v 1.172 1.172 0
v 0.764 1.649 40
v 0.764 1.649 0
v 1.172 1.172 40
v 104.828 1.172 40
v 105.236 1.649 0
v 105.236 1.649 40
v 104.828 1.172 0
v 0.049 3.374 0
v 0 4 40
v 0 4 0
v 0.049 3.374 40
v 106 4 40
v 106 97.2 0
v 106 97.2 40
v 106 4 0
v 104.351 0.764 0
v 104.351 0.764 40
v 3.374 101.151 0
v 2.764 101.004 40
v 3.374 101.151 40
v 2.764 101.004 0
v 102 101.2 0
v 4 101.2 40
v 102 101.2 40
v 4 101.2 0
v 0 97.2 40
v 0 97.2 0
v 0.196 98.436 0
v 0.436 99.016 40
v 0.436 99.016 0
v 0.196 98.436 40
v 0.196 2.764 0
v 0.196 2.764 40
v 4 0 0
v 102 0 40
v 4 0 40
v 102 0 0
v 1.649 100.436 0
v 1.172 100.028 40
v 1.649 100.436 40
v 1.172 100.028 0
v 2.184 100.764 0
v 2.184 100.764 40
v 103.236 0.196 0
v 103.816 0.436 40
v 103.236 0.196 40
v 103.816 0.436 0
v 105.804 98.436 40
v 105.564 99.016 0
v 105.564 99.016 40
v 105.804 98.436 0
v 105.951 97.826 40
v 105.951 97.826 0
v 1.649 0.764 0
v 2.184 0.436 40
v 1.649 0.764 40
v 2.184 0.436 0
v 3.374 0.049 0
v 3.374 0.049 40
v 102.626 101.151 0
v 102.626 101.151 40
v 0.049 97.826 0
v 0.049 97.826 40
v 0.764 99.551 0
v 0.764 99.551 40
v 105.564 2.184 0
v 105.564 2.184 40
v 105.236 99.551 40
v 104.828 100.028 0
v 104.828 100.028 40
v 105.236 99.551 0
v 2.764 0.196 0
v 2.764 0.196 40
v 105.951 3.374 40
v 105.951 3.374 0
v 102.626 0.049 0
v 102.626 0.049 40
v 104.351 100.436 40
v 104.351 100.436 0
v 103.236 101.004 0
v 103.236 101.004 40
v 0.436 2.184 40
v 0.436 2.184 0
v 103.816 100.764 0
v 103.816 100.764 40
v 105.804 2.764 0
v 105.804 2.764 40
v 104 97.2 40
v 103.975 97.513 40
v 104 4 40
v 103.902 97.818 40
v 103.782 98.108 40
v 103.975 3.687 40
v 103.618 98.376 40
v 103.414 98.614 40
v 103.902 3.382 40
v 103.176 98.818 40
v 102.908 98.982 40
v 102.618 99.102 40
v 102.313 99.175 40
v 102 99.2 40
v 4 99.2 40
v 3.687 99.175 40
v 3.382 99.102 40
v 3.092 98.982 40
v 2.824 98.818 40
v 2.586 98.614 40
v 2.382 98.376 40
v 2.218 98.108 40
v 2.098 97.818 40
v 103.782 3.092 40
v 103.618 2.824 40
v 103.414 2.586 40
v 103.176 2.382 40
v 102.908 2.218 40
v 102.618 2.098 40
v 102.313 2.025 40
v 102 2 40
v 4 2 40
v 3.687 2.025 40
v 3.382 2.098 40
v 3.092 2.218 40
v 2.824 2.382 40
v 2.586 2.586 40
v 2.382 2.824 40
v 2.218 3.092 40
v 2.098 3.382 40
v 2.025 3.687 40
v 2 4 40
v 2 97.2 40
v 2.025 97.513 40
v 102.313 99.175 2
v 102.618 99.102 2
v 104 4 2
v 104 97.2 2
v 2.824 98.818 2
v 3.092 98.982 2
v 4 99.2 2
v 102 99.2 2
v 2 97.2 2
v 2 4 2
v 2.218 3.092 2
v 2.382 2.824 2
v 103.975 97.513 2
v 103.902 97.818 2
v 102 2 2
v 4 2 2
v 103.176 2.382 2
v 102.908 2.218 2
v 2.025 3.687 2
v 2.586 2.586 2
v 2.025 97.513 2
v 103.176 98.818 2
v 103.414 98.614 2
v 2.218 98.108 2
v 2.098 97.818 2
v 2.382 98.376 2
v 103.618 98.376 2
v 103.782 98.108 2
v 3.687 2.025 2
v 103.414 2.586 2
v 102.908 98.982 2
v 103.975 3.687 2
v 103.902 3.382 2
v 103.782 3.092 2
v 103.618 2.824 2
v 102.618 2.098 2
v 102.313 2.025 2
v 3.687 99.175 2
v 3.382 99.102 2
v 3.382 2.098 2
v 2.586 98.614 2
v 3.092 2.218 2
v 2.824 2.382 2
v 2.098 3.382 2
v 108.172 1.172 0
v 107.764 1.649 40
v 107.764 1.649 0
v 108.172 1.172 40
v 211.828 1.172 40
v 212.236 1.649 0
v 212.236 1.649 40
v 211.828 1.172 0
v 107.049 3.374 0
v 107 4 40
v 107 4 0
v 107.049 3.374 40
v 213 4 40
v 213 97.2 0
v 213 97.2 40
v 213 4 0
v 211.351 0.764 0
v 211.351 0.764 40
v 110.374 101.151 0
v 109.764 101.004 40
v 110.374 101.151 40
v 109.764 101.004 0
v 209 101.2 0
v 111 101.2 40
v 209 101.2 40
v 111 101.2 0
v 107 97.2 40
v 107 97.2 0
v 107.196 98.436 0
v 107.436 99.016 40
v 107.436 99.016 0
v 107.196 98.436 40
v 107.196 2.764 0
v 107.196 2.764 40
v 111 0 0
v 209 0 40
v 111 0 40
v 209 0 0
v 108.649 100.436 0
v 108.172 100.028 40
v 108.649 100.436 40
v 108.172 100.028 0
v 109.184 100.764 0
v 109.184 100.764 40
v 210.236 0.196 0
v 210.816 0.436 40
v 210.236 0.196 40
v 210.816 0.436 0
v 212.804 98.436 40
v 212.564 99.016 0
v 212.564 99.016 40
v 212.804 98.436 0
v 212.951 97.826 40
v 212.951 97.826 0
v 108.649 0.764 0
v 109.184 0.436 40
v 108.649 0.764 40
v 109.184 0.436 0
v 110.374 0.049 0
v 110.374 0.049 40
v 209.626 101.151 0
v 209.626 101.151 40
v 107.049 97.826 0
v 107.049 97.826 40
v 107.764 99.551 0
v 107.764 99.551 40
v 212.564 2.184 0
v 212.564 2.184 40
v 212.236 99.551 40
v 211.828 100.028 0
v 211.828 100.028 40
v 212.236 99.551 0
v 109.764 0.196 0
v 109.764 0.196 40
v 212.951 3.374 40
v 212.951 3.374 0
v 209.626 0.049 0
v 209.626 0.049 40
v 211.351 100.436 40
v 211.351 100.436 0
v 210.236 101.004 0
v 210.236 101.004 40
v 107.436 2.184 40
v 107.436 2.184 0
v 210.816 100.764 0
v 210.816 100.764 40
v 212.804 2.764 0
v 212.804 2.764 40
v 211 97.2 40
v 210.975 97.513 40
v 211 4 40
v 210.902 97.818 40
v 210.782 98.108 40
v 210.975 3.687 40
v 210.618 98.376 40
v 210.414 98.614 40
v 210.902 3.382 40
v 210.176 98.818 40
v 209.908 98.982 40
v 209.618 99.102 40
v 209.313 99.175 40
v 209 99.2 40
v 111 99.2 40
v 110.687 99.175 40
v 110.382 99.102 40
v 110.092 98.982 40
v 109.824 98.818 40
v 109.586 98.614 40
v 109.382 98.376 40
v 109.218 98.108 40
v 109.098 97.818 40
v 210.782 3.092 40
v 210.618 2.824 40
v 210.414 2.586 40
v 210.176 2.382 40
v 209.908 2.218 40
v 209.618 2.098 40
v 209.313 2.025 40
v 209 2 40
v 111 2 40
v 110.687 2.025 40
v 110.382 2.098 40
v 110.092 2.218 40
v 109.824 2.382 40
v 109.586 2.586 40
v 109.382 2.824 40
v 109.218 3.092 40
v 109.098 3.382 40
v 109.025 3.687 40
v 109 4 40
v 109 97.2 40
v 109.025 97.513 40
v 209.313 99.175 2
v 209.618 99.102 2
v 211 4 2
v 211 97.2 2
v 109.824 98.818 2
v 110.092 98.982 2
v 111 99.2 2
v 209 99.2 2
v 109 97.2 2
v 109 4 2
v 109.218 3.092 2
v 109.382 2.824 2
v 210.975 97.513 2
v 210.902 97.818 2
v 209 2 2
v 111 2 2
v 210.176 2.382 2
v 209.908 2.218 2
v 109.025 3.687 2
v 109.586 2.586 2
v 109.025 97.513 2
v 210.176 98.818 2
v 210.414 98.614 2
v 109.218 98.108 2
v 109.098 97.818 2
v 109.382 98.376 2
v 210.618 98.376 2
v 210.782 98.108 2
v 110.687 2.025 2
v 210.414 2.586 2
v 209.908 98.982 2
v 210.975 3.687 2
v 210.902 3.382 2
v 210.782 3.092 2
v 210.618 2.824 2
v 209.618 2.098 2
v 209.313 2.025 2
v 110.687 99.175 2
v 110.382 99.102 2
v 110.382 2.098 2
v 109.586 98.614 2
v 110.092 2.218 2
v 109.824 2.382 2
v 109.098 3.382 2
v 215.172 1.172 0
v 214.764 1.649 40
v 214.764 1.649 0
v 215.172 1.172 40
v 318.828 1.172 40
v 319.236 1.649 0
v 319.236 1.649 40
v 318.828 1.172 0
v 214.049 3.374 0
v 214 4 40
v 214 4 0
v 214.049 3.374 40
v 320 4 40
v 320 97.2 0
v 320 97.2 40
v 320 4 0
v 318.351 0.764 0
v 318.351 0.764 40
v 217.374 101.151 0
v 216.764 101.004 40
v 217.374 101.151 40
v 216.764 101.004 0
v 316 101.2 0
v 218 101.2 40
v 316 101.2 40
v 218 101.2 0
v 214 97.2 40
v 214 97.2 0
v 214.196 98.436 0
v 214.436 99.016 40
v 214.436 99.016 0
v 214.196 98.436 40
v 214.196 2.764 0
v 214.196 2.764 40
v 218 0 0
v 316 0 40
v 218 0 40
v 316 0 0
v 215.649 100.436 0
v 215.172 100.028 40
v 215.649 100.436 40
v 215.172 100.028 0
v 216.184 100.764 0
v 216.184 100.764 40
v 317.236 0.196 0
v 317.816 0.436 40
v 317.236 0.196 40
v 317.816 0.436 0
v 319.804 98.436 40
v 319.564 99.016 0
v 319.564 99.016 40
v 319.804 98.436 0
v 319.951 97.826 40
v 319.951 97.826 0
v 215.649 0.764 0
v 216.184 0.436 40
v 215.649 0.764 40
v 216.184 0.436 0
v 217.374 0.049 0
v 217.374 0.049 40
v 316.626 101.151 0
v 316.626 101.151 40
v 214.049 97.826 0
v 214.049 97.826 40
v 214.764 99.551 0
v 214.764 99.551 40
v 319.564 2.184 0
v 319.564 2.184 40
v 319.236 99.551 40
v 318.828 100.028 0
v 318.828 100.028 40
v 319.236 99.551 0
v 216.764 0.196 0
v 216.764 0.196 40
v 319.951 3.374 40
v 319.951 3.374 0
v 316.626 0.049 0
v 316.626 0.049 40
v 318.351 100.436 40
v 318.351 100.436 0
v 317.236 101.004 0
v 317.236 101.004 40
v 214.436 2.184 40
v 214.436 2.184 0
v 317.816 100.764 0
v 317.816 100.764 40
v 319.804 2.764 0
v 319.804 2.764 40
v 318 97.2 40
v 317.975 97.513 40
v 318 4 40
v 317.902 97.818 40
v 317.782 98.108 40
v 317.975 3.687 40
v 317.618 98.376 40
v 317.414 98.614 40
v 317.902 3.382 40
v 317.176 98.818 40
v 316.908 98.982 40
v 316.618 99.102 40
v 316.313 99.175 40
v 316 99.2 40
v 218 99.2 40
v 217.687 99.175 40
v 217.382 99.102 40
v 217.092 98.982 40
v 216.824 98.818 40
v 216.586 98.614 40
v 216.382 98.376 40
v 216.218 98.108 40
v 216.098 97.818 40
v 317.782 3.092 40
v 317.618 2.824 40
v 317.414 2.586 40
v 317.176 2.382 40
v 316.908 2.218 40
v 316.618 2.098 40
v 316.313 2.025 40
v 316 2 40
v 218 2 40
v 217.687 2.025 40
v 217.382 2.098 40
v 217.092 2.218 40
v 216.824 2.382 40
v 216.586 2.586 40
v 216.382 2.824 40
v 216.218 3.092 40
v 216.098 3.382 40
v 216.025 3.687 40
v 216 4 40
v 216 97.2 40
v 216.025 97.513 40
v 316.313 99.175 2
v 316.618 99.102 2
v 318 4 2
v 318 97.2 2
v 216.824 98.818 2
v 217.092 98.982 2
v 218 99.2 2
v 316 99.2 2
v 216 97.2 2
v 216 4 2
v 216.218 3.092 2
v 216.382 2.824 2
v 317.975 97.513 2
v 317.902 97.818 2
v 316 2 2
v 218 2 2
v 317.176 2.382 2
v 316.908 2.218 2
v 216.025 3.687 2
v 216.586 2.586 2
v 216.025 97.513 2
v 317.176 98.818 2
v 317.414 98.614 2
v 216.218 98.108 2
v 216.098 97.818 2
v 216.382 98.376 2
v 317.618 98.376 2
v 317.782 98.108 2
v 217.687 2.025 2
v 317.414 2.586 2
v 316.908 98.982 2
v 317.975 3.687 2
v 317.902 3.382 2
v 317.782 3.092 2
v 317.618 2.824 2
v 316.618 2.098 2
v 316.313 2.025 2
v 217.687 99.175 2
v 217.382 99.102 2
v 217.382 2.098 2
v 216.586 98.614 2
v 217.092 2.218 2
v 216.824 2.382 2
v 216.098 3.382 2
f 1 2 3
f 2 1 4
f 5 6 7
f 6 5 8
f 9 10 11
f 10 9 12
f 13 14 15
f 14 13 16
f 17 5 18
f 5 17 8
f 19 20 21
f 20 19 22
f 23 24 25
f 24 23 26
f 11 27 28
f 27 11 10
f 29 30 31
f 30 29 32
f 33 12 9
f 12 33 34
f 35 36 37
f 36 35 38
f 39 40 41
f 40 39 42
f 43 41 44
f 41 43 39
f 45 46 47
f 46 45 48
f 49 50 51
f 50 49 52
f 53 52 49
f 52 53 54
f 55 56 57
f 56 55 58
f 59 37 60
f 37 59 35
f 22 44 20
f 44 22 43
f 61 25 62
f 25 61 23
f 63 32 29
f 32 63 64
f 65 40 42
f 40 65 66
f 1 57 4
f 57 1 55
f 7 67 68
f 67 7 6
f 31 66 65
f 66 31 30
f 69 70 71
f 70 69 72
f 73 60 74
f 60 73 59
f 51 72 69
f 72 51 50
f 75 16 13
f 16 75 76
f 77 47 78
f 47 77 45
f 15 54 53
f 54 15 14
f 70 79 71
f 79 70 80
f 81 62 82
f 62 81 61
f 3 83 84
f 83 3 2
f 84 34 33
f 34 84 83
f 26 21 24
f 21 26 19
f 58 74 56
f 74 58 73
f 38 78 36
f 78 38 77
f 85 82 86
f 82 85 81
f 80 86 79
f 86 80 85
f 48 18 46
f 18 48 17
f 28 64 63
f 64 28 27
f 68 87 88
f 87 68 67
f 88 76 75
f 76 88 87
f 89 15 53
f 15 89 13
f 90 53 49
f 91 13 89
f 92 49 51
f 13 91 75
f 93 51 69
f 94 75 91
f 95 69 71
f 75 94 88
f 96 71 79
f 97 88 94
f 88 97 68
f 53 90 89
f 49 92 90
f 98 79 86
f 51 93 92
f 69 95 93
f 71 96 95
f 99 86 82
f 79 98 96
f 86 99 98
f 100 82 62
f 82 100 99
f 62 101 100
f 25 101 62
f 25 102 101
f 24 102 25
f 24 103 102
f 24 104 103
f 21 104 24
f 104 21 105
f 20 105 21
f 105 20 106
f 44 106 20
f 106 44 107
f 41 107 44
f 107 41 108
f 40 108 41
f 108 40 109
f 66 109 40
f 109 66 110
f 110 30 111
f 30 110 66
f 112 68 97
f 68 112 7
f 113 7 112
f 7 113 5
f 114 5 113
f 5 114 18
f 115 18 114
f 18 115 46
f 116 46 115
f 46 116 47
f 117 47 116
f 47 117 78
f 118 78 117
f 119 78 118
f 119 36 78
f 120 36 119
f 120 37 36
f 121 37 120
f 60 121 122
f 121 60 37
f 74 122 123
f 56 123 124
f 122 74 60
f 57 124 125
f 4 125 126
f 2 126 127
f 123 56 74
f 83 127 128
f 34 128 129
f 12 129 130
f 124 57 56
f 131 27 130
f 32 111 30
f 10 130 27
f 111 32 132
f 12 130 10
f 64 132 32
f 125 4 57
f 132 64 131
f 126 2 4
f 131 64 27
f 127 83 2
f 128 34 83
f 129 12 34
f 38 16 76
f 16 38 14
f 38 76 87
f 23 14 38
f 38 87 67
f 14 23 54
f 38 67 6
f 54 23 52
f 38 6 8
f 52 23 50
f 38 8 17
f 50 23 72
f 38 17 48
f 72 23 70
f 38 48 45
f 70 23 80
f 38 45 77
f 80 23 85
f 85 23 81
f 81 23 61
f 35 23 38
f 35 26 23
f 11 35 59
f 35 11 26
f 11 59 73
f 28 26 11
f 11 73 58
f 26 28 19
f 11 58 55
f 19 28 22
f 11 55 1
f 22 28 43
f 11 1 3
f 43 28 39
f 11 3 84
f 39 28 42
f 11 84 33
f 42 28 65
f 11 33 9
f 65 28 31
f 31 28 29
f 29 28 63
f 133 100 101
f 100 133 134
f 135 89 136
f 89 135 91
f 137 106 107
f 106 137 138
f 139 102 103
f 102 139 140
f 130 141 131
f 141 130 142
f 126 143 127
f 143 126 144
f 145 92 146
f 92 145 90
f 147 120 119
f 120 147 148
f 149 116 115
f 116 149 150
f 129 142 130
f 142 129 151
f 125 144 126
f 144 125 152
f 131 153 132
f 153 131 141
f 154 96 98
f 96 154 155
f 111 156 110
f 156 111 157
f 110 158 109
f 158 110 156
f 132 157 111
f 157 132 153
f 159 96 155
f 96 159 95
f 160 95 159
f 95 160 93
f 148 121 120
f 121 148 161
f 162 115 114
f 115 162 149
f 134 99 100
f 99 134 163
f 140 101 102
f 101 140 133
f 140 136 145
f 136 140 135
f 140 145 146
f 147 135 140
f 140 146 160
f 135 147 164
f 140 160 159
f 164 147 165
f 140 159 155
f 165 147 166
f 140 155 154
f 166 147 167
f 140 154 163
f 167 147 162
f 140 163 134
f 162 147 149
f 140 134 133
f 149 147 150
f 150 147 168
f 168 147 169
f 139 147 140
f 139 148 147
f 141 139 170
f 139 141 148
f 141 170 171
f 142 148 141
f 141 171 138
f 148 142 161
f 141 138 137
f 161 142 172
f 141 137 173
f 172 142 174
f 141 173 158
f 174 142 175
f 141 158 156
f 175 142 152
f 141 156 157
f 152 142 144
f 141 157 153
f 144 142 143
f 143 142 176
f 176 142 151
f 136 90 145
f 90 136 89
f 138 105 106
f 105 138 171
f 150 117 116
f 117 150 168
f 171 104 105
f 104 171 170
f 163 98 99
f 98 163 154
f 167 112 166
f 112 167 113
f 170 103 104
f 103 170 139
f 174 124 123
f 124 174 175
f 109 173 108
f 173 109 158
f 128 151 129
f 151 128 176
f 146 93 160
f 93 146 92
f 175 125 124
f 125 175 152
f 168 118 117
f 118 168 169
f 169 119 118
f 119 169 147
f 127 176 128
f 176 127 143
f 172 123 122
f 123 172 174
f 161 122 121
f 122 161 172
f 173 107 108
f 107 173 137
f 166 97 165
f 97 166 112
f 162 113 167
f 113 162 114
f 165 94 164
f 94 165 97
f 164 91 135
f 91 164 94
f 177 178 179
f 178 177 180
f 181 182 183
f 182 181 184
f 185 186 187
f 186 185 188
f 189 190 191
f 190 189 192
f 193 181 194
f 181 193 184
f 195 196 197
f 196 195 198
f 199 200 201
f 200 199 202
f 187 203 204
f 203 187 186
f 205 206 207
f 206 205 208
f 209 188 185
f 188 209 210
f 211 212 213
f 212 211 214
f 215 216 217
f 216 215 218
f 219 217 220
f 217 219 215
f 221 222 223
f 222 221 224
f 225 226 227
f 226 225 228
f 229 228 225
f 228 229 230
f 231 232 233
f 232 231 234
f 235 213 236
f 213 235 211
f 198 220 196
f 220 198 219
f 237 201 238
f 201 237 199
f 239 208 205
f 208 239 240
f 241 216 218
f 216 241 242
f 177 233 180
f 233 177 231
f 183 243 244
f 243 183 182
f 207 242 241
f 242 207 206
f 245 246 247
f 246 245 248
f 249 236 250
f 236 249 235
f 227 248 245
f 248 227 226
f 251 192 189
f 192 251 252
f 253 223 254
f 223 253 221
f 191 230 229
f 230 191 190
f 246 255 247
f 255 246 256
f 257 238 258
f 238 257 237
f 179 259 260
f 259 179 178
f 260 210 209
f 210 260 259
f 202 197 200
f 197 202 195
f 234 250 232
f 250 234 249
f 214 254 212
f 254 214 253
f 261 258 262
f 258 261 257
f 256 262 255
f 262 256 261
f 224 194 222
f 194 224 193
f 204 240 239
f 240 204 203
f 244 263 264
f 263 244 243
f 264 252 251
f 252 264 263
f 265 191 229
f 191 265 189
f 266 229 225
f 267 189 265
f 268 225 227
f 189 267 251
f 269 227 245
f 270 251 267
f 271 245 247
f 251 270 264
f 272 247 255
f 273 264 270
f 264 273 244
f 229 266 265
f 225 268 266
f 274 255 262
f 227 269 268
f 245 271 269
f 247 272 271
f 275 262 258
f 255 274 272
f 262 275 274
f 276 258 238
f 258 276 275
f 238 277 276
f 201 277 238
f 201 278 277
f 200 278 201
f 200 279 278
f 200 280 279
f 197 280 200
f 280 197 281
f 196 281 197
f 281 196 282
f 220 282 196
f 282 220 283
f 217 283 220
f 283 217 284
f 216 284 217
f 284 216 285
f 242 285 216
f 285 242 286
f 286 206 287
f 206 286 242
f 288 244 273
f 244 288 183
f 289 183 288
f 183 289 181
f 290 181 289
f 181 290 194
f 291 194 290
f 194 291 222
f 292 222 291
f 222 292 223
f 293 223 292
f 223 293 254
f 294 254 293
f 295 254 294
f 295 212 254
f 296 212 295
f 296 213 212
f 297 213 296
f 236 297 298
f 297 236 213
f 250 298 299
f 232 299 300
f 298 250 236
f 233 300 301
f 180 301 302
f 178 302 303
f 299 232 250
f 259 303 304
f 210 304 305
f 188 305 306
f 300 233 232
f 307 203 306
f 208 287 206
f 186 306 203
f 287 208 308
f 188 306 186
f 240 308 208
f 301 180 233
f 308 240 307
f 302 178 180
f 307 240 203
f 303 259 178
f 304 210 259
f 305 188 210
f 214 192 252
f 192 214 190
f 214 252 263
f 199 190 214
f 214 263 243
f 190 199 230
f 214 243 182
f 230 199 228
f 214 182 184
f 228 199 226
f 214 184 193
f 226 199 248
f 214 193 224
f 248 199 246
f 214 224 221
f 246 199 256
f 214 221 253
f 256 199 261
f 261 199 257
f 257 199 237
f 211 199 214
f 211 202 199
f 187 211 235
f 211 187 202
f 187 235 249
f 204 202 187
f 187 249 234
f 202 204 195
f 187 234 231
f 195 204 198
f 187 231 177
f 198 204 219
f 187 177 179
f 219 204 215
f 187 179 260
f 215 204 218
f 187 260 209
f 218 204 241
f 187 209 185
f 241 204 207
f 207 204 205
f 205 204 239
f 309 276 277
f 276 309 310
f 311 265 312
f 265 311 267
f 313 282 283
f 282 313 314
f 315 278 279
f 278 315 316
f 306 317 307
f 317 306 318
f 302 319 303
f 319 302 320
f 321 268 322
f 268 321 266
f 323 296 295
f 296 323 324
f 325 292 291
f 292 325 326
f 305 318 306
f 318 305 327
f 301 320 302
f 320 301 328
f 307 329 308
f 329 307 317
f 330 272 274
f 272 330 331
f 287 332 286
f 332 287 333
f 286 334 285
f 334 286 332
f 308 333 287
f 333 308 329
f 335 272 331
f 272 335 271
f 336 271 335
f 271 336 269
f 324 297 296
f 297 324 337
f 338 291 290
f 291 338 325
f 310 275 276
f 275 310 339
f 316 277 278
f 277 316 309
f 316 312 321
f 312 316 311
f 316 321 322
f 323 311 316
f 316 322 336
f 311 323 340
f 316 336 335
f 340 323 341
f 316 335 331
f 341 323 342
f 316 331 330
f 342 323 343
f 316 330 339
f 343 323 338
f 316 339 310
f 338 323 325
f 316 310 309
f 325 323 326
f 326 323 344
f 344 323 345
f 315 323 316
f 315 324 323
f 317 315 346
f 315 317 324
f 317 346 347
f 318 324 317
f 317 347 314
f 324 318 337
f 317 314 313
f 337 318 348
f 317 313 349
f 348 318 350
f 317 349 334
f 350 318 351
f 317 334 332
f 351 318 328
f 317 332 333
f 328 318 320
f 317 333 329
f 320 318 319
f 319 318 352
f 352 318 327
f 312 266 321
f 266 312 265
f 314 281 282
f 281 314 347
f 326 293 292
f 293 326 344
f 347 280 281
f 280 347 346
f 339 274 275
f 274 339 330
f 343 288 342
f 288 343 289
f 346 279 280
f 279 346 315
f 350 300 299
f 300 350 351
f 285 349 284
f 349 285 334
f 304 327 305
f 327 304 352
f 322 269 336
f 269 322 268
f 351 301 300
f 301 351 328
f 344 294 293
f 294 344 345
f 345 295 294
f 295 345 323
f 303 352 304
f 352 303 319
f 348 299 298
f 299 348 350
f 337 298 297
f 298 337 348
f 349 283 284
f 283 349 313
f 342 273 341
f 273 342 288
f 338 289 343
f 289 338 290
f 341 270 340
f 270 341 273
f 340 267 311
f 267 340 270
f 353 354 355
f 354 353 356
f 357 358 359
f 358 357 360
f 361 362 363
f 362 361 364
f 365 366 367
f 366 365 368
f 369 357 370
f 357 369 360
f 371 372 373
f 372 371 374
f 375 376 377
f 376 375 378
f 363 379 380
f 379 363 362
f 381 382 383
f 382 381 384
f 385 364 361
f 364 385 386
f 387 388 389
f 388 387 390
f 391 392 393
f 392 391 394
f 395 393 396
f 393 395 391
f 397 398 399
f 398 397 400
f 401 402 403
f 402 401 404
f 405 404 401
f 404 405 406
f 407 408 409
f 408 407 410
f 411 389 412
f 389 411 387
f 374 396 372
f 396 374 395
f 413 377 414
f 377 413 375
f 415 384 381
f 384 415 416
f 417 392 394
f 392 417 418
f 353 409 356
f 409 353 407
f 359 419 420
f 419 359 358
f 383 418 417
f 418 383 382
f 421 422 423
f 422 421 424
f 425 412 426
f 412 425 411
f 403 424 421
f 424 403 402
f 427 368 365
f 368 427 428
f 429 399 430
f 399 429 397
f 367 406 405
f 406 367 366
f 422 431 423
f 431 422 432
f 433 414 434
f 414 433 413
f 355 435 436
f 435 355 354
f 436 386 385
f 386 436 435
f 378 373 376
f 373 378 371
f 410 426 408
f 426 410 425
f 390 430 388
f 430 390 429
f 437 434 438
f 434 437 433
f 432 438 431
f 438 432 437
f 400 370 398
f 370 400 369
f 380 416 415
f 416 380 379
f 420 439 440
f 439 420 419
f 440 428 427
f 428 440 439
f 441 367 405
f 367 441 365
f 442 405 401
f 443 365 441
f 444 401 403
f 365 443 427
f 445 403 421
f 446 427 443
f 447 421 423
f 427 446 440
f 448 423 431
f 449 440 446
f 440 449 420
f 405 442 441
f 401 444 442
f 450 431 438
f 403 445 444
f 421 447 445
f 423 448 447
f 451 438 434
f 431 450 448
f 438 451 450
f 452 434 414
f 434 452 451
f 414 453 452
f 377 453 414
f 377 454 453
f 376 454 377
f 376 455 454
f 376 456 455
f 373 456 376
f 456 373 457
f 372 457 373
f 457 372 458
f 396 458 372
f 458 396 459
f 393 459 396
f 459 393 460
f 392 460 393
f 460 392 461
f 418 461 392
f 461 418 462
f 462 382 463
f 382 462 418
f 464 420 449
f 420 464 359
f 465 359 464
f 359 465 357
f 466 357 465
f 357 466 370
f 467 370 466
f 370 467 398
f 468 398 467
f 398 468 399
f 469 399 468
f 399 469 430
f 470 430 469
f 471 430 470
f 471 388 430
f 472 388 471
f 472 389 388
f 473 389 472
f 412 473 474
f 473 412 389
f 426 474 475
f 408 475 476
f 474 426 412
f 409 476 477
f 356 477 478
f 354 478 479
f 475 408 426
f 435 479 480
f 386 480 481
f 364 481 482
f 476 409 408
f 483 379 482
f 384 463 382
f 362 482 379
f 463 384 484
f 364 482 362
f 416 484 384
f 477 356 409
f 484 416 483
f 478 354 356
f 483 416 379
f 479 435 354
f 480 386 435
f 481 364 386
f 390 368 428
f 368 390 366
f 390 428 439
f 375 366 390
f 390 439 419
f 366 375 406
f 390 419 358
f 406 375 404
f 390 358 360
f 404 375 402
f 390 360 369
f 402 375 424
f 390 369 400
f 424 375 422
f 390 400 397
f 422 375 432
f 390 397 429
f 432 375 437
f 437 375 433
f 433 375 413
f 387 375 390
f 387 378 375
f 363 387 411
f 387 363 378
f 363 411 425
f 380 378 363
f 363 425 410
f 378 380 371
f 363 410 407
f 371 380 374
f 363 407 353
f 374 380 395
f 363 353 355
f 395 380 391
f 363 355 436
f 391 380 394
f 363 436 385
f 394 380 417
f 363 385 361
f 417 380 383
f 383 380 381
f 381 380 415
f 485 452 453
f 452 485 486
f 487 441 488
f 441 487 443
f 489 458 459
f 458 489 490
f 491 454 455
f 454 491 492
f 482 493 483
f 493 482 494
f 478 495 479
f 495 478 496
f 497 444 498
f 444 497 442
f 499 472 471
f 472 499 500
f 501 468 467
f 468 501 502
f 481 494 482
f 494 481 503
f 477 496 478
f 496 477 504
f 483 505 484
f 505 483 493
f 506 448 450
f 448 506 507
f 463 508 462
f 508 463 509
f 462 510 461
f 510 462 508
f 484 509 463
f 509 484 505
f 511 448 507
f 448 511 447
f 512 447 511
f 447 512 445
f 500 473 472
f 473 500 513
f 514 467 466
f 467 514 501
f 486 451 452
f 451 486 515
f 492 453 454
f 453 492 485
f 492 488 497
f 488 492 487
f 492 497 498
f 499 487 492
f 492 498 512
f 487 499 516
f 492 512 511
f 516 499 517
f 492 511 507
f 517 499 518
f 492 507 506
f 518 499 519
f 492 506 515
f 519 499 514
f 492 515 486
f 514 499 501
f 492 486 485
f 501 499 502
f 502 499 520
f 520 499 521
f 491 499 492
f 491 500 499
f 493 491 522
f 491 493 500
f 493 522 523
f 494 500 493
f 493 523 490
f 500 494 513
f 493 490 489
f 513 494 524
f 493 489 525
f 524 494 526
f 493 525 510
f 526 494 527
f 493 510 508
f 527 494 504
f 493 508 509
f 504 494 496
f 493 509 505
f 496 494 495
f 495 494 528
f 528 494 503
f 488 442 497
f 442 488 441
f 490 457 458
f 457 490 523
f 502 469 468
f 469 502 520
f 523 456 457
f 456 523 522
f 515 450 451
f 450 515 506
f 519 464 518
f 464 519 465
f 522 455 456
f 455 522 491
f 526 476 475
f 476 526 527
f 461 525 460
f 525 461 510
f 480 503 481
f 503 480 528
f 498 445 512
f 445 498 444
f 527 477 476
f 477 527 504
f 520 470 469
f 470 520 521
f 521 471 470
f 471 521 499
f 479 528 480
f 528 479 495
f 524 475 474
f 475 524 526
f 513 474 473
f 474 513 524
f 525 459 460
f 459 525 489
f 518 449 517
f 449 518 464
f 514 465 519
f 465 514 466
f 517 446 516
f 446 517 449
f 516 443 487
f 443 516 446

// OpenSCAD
include <protective_storage_box.scad>
lid_angle = 0;
show_tray_in_assembly = false;
render_assembly = false;
tray_middle();
